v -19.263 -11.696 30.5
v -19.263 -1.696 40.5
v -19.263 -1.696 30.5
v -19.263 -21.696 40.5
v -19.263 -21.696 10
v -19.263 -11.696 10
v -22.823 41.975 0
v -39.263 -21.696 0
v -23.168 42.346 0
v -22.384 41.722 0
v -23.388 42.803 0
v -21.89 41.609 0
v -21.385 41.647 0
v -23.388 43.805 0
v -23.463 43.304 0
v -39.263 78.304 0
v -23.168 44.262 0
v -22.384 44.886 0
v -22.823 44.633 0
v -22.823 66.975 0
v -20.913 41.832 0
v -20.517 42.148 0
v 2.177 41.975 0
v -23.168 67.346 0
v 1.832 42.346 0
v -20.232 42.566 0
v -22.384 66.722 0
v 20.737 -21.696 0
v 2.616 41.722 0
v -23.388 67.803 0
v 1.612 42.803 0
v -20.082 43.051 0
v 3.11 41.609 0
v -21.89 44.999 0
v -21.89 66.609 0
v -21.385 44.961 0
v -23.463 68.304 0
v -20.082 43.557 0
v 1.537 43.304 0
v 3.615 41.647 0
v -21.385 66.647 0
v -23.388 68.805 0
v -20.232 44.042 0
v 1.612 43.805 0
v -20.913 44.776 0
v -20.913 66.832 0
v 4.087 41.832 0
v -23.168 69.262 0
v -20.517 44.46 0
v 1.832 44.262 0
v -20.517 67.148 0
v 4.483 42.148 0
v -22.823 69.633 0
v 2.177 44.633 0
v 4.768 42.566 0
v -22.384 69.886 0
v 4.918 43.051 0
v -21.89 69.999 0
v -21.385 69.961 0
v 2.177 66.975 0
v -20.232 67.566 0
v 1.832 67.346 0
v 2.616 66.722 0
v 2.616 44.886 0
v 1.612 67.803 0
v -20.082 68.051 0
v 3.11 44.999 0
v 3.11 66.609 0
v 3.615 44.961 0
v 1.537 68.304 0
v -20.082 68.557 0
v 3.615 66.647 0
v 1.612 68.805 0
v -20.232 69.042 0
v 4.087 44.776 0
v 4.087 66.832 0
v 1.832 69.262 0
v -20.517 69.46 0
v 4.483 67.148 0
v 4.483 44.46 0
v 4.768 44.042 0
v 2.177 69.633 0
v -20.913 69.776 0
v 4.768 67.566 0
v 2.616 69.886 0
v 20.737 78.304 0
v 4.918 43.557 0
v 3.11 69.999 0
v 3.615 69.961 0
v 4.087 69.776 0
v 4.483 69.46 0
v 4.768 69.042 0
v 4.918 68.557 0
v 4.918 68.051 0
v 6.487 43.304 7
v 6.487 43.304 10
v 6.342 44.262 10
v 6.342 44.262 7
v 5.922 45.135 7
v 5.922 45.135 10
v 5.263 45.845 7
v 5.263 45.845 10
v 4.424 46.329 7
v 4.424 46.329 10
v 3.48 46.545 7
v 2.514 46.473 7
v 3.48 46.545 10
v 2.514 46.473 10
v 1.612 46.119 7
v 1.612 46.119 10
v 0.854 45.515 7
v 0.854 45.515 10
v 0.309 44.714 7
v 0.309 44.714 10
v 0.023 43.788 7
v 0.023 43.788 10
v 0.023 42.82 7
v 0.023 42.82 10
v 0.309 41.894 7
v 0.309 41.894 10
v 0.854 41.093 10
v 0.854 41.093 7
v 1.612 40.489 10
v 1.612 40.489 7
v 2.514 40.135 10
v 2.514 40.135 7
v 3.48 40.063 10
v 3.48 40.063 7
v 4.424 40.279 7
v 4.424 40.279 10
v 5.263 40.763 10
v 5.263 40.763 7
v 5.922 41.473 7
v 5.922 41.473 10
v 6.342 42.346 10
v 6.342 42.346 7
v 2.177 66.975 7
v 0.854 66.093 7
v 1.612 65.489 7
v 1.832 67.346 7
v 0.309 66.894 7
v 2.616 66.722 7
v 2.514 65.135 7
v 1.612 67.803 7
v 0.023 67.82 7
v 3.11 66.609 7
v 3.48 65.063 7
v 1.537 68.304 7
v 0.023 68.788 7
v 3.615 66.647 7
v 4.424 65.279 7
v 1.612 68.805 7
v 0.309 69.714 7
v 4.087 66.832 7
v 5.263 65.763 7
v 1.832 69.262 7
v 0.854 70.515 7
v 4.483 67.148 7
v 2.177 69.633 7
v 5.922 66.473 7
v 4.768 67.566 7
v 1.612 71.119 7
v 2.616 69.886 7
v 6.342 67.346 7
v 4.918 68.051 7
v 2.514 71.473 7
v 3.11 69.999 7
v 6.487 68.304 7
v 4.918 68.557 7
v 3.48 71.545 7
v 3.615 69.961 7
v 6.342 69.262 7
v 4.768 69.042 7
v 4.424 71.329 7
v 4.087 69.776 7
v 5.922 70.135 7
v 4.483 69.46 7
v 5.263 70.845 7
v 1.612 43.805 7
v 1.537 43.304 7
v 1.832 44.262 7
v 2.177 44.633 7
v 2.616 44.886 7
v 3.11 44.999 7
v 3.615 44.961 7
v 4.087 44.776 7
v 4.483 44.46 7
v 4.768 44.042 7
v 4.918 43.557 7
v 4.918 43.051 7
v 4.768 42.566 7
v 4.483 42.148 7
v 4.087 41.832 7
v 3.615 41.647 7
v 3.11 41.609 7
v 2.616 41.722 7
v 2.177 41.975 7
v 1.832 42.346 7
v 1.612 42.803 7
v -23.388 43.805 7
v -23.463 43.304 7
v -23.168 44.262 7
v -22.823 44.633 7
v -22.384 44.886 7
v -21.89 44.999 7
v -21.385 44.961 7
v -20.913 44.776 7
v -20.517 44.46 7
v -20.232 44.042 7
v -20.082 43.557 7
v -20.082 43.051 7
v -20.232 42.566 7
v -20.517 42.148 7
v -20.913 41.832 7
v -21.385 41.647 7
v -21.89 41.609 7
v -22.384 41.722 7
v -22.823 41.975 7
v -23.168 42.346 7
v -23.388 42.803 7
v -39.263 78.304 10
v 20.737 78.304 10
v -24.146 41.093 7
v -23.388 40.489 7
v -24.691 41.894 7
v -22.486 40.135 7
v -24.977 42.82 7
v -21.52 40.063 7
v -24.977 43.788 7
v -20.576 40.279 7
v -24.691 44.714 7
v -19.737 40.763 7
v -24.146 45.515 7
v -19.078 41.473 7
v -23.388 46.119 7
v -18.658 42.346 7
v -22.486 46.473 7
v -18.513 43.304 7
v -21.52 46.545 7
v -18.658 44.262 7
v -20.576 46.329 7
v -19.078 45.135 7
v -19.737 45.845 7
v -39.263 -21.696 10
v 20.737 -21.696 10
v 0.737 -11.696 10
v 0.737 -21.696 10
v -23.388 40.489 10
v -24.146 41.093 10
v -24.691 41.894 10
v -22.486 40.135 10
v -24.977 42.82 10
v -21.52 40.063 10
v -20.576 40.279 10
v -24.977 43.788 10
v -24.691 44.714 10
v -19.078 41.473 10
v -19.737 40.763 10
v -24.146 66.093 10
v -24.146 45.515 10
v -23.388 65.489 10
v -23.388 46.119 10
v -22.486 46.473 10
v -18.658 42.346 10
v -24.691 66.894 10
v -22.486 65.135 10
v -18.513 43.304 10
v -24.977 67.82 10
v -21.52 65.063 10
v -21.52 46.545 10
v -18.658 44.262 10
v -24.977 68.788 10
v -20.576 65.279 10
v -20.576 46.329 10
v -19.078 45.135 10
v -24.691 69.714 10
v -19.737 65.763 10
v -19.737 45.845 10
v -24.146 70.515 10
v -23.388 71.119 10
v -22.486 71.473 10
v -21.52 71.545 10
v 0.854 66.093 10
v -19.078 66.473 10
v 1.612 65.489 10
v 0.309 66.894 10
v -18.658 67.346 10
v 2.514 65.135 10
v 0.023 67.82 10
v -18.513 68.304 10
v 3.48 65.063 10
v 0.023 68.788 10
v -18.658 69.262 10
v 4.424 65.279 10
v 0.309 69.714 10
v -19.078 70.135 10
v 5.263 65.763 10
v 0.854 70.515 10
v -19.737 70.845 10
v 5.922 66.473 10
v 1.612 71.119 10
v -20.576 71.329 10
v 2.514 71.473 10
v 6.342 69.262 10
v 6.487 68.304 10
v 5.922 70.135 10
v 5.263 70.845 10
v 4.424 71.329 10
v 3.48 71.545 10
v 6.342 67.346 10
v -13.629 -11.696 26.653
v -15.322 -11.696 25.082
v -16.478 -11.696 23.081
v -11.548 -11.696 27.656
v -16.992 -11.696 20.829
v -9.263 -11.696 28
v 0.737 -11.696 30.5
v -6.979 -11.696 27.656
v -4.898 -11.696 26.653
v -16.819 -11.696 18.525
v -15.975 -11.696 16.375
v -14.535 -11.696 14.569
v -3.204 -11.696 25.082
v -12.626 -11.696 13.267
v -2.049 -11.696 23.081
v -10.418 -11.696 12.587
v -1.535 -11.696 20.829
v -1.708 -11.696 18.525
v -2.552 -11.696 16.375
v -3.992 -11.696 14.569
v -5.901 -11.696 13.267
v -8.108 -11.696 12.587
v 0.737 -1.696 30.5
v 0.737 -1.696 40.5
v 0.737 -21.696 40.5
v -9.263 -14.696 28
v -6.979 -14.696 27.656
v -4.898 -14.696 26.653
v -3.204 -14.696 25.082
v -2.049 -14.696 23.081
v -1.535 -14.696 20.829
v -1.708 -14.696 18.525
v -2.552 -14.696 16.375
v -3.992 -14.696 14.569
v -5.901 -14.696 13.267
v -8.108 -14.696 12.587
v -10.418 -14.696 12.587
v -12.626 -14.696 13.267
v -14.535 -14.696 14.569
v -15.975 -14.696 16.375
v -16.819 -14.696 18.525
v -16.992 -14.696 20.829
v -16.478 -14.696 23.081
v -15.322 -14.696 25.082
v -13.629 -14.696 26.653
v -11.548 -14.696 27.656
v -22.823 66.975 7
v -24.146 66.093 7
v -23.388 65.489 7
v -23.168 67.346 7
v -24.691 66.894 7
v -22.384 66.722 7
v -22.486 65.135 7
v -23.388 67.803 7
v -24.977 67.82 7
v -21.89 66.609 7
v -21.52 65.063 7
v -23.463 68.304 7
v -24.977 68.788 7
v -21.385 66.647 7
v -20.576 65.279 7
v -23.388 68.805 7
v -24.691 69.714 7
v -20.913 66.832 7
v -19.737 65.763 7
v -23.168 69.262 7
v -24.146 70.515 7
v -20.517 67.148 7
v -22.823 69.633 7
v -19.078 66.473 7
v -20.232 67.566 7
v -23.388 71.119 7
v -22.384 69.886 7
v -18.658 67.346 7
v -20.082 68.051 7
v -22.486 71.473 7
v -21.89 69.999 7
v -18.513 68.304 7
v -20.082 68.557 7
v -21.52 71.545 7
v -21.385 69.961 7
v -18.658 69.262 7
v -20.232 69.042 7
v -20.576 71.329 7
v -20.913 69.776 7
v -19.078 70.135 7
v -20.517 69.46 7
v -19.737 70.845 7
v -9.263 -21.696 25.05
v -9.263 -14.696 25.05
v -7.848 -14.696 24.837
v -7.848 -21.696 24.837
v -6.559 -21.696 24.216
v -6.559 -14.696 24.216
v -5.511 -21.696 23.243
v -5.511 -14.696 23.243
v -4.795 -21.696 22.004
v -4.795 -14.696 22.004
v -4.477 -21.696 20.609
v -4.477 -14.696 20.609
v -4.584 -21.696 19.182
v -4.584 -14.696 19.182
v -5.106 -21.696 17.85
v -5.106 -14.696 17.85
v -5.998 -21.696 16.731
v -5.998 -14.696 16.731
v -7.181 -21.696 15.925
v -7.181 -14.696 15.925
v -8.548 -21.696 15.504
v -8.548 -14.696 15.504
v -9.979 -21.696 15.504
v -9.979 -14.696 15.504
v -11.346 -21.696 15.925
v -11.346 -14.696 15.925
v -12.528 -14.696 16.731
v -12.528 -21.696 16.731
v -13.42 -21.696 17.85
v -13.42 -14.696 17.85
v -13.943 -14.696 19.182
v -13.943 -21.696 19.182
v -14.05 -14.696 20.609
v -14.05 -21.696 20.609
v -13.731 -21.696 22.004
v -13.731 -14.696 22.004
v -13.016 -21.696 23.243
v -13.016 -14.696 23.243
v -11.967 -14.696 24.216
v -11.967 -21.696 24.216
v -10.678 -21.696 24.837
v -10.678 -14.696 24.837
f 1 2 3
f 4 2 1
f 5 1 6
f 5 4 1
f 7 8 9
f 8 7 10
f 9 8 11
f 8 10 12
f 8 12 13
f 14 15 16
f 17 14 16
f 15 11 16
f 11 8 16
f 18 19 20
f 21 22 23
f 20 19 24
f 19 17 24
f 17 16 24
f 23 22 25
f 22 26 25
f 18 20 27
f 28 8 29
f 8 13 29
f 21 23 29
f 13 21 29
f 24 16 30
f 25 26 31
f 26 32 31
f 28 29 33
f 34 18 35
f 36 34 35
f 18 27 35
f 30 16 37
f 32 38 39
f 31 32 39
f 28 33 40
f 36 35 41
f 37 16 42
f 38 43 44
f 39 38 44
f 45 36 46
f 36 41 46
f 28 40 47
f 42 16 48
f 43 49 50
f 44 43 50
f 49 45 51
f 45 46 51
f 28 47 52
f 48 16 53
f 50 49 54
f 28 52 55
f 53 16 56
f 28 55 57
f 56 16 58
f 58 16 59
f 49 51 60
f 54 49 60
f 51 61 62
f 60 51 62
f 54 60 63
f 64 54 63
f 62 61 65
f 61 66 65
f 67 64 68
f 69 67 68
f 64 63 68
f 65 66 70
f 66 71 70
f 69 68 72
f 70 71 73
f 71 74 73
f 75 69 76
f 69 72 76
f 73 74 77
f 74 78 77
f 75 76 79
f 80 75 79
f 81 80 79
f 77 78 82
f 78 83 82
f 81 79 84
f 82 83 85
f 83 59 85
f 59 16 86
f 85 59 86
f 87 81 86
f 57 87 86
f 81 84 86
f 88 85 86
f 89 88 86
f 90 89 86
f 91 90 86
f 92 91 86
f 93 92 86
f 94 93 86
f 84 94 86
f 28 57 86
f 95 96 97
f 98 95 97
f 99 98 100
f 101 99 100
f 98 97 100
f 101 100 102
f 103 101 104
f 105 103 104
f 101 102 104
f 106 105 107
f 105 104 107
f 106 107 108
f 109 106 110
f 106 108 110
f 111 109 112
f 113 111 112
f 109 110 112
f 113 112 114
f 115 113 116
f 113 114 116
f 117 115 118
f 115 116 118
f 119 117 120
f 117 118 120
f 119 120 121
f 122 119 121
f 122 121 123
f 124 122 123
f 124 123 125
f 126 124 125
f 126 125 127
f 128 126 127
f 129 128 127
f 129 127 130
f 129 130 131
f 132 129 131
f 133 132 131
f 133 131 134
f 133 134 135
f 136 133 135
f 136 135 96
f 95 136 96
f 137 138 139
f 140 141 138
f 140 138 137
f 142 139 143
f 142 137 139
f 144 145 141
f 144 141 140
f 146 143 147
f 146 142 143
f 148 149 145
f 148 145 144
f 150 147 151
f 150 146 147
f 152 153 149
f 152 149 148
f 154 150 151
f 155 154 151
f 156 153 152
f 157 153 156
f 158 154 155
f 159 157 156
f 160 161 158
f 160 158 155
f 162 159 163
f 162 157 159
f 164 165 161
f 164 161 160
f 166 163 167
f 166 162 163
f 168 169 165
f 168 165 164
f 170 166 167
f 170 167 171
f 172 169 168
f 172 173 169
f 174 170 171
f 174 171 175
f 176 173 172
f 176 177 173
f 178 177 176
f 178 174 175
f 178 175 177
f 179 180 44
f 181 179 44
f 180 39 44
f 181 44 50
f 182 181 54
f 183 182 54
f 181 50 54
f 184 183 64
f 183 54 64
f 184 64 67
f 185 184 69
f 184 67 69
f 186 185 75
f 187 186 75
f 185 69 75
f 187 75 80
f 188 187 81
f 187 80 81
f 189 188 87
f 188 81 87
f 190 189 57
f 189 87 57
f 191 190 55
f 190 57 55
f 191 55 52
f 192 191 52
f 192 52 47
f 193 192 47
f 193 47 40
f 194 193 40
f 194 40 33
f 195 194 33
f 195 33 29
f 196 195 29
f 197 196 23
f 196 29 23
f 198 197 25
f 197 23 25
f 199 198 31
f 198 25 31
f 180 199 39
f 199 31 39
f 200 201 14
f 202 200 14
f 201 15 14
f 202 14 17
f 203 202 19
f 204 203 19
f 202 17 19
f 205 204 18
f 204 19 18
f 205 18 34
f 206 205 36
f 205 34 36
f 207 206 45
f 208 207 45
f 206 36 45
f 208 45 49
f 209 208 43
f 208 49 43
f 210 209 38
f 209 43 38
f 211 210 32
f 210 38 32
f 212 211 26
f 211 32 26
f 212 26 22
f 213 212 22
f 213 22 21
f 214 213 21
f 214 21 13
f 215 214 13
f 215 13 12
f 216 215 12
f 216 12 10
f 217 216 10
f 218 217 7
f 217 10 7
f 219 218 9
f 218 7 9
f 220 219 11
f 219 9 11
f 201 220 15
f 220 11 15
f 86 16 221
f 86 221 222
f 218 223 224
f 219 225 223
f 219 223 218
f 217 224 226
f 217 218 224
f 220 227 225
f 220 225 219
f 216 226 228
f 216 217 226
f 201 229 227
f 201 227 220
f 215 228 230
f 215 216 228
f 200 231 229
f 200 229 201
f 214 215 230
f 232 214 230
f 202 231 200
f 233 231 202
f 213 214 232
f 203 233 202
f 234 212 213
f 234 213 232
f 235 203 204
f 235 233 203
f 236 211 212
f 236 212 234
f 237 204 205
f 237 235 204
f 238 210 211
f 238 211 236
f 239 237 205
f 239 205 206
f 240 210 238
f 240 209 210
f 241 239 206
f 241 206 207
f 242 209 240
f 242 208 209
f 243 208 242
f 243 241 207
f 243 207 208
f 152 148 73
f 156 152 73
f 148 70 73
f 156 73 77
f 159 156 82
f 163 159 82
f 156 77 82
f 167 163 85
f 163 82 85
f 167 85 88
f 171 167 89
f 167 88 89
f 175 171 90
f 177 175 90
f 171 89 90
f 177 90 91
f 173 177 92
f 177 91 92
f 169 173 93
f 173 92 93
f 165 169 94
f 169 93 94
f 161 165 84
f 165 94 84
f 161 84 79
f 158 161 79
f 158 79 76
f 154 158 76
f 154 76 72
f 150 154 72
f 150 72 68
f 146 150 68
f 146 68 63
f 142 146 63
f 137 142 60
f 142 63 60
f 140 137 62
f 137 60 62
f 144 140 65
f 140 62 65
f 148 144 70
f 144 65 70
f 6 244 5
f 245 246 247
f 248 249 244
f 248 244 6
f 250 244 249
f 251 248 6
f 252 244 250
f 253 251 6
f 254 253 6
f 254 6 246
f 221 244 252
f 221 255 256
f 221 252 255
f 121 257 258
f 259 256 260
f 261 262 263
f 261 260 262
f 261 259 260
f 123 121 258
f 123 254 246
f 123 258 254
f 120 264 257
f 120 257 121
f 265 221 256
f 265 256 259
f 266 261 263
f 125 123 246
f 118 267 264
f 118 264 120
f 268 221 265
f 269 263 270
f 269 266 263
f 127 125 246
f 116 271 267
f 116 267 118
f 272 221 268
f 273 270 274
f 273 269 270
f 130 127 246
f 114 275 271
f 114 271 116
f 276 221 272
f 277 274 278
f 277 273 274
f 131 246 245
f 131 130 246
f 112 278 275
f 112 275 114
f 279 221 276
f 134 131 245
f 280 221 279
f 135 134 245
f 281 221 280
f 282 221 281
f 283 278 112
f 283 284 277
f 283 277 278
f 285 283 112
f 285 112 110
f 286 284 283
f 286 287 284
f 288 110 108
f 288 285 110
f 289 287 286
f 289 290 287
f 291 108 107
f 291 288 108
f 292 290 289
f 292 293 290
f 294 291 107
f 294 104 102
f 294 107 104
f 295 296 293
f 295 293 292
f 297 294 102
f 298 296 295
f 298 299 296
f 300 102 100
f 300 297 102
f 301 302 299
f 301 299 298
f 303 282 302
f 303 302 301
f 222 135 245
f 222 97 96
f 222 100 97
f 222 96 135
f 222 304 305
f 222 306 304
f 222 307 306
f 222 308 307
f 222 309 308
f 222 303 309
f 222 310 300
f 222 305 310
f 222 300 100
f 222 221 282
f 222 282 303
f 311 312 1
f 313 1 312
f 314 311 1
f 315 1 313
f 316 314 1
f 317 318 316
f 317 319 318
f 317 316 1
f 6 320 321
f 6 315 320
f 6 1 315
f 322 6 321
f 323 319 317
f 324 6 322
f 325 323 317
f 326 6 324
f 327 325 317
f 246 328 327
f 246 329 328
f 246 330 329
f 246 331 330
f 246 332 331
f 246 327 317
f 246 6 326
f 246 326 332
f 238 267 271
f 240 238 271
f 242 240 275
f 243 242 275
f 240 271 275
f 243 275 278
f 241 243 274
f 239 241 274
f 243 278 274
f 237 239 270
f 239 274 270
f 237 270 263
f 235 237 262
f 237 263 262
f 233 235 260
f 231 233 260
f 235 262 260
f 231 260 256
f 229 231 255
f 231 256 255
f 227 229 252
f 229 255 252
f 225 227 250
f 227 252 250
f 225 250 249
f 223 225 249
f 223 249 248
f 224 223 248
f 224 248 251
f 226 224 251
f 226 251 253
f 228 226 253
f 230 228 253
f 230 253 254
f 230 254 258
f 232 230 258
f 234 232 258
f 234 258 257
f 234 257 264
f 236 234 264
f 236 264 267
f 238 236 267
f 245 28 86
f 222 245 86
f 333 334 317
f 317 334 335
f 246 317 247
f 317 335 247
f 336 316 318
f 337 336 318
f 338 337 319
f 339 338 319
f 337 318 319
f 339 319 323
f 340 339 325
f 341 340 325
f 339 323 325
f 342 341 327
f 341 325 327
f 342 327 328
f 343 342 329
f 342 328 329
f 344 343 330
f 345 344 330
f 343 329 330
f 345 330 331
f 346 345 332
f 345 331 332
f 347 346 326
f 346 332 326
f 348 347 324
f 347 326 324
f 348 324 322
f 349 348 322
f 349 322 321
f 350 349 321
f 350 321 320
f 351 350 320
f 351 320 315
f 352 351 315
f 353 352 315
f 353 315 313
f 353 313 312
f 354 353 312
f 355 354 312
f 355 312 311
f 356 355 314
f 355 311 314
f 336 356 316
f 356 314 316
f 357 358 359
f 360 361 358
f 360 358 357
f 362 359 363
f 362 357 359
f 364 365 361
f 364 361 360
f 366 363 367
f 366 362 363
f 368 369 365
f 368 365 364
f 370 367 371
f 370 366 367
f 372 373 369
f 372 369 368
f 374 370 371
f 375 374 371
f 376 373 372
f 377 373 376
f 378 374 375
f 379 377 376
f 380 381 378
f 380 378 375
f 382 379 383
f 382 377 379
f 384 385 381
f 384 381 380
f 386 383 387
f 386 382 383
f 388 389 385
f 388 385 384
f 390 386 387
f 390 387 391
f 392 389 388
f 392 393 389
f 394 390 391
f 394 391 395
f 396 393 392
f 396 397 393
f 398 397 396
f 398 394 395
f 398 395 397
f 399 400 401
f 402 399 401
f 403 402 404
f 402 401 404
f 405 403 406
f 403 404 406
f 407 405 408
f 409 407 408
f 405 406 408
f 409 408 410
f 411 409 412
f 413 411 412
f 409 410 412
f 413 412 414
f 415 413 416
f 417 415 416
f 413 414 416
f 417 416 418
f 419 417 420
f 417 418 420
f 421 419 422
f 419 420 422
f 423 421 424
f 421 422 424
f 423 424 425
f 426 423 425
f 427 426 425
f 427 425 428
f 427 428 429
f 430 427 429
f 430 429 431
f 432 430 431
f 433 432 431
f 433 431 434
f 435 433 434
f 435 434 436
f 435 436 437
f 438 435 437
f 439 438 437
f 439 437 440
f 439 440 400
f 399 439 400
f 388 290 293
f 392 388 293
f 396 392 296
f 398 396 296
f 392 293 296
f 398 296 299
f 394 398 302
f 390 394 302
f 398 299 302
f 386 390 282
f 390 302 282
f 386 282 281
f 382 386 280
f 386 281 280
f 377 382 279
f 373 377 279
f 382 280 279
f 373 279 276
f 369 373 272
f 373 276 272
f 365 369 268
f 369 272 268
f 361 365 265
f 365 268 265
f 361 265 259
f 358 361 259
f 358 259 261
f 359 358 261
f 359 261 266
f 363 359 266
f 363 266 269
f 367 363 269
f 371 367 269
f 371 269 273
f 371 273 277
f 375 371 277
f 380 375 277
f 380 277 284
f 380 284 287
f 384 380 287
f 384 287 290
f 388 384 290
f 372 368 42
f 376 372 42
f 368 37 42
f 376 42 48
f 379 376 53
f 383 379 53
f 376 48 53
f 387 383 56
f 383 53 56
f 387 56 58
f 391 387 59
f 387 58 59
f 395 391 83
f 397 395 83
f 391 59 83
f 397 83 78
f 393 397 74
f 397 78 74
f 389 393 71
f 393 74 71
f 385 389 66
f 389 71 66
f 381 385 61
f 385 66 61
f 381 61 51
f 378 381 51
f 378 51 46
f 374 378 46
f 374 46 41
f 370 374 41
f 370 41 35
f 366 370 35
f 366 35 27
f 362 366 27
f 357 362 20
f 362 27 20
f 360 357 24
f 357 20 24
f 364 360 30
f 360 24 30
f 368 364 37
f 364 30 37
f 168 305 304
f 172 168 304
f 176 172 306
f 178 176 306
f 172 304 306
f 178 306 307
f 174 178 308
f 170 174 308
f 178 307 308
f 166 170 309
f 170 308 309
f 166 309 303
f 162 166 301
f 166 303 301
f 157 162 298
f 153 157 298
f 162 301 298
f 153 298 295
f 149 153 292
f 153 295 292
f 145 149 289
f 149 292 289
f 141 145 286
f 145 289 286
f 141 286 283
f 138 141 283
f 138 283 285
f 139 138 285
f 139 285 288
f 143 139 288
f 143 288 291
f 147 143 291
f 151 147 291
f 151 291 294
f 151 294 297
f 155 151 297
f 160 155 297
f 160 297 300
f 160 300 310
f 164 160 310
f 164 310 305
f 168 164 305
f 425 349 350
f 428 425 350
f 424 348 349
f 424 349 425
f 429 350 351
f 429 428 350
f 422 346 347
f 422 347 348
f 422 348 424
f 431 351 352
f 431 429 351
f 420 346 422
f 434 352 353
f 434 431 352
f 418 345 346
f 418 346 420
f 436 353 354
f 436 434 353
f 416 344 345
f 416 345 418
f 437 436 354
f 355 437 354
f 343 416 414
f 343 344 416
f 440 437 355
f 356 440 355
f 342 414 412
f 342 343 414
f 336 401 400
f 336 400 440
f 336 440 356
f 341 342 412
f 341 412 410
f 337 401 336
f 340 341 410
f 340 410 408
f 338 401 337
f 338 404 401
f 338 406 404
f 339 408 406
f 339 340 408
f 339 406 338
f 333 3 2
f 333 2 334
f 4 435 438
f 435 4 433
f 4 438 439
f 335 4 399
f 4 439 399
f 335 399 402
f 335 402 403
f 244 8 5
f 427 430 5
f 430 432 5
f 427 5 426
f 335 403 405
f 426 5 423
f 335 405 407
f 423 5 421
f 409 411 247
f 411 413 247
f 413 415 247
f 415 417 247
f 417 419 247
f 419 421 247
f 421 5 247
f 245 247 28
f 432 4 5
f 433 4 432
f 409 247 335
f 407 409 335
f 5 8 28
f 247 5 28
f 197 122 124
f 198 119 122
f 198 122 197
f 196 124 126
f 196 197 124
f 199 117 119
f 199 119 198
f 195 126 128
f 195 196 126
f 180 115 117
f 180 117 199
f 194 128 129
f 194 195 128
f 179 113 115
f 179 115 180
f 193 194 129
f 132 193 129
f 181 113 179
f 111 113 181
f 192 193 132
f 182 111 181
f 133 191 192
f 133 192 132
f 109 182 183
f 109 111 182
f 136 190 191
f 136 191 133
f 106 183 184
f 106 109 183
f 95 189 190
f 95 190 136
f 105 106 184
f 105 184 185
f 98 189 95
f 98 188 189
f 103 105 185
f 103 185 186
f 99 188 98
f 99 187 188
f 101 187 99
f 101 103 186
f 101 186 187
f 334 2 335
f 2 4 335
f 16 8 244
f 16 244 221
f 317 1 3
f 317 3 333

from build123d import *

# Parameters (mm, degrees)
SKETCH1_W                      = 60
SKETCH1_H                      = 100
EXTRUDE1_DEPTH                 = 10
SKETCH2_W                      = 20
SKETCH2_H                      = 10
EXTRUDE2_DEPTH                 = 30.5
SKETCH4_W                      = 20
SKETCH4_H                      = 10
EXTRUDE3_DEPTH                 = 10
SKETCH5_R                      = 7.75
CUT_EXTRUDE1_DEPTH             = 3
SKETCH6_R                      = 4.8
CUT_EXTRUDE2_DEPTH             = 109.769738684
CBORE_FOR_M3_SHCS1_D           = 3.4
CBORE_FOR_M3_SHCS1_CBORE_D     = 6.5
CBORE_FOR_M3_SHCS1_CBORE_DEPTH = 3


with BuildPart() as part:
    # Sketch1 → Extrude1 (new body)
    with BuildSketch(Plane.XY):
        with Locations((-9.263291422, 28.303995668)):
            Rectangle(SKETCH1_W, SKETCH1_H)
    extrude(amount=EXTRUDE1_DEPTH)

    # Sketch2 → Extrude2 (add)
    with BuildSketch(Plane.XY.offset(10)):
        with Locations((-9.263291422, -16.696004332)):
            Rectangle(SKETCH2_W, SKETCH2_H)
    extrude(amount=EXTRUDE2_DEPTH)

    # Sketch4 → Extrude3 (add)
    with BuildSketch(Plane(origin=(0, -11.696004332, 0), x_dir=(1, 0, 0), z_dir=(0, 1, 0))):
        with Locations((-9.263291422, -35.5)):
            Rectangle(SKETCH4_W, SKETCH4_H)
    extrude(amount=EXTRUDE3_DEPTH)

    # Sketch5 → Cut-Extrude1 (cut)
    with BuildSketch(Plane(origin=(0, -11.696004332, 0), x_dir=(1, 0, 0), z_dir=(0, 1, 0))):
        with Locations(Location((-9.263291422, -20.25, 0), (0, 0, 270))):
            Circle(SKETCH5_R)
    extrude(amount=-CUT_EXTRUDE1_DEPTH, mode=Mode.SUBTRACT)

    # Sketch6 → Cut-Extrude2 (cut, through all)
    with BuildSketch(Plane(origin=(0, -14.696004332, 0), x_dir=(1, 0, 0), z_dir=(0, 1, 0))):
        with Locations(Location((-9.263291422, -20.25, 0), (0, 0, 270))):
            Circle(SKETCH6_R)
    extrude(amount=-CUT_EXTRUDE2_DEPTH, mode=Mode.SUBTRACT)

    # CBORE for M3 SHCS1 (through all)
    with Locations(Plane(origin=(-21.763291422, 68.303995668, 10), x_dir=(1, 0, 0), z_dir=(0, 0, 1))):
        with Locations((0, 0), (0, -25), (25, 0), (25, -25)):
            CounterBoreHole(CBORE_FOR_M3_SHCS1_D / 2, CBORE_FOR_M3_SHCS1_CBORE_D / 2, CBORE_FOR_M3_SHCS1_CBORE_DEPTH)


solid = part.part
